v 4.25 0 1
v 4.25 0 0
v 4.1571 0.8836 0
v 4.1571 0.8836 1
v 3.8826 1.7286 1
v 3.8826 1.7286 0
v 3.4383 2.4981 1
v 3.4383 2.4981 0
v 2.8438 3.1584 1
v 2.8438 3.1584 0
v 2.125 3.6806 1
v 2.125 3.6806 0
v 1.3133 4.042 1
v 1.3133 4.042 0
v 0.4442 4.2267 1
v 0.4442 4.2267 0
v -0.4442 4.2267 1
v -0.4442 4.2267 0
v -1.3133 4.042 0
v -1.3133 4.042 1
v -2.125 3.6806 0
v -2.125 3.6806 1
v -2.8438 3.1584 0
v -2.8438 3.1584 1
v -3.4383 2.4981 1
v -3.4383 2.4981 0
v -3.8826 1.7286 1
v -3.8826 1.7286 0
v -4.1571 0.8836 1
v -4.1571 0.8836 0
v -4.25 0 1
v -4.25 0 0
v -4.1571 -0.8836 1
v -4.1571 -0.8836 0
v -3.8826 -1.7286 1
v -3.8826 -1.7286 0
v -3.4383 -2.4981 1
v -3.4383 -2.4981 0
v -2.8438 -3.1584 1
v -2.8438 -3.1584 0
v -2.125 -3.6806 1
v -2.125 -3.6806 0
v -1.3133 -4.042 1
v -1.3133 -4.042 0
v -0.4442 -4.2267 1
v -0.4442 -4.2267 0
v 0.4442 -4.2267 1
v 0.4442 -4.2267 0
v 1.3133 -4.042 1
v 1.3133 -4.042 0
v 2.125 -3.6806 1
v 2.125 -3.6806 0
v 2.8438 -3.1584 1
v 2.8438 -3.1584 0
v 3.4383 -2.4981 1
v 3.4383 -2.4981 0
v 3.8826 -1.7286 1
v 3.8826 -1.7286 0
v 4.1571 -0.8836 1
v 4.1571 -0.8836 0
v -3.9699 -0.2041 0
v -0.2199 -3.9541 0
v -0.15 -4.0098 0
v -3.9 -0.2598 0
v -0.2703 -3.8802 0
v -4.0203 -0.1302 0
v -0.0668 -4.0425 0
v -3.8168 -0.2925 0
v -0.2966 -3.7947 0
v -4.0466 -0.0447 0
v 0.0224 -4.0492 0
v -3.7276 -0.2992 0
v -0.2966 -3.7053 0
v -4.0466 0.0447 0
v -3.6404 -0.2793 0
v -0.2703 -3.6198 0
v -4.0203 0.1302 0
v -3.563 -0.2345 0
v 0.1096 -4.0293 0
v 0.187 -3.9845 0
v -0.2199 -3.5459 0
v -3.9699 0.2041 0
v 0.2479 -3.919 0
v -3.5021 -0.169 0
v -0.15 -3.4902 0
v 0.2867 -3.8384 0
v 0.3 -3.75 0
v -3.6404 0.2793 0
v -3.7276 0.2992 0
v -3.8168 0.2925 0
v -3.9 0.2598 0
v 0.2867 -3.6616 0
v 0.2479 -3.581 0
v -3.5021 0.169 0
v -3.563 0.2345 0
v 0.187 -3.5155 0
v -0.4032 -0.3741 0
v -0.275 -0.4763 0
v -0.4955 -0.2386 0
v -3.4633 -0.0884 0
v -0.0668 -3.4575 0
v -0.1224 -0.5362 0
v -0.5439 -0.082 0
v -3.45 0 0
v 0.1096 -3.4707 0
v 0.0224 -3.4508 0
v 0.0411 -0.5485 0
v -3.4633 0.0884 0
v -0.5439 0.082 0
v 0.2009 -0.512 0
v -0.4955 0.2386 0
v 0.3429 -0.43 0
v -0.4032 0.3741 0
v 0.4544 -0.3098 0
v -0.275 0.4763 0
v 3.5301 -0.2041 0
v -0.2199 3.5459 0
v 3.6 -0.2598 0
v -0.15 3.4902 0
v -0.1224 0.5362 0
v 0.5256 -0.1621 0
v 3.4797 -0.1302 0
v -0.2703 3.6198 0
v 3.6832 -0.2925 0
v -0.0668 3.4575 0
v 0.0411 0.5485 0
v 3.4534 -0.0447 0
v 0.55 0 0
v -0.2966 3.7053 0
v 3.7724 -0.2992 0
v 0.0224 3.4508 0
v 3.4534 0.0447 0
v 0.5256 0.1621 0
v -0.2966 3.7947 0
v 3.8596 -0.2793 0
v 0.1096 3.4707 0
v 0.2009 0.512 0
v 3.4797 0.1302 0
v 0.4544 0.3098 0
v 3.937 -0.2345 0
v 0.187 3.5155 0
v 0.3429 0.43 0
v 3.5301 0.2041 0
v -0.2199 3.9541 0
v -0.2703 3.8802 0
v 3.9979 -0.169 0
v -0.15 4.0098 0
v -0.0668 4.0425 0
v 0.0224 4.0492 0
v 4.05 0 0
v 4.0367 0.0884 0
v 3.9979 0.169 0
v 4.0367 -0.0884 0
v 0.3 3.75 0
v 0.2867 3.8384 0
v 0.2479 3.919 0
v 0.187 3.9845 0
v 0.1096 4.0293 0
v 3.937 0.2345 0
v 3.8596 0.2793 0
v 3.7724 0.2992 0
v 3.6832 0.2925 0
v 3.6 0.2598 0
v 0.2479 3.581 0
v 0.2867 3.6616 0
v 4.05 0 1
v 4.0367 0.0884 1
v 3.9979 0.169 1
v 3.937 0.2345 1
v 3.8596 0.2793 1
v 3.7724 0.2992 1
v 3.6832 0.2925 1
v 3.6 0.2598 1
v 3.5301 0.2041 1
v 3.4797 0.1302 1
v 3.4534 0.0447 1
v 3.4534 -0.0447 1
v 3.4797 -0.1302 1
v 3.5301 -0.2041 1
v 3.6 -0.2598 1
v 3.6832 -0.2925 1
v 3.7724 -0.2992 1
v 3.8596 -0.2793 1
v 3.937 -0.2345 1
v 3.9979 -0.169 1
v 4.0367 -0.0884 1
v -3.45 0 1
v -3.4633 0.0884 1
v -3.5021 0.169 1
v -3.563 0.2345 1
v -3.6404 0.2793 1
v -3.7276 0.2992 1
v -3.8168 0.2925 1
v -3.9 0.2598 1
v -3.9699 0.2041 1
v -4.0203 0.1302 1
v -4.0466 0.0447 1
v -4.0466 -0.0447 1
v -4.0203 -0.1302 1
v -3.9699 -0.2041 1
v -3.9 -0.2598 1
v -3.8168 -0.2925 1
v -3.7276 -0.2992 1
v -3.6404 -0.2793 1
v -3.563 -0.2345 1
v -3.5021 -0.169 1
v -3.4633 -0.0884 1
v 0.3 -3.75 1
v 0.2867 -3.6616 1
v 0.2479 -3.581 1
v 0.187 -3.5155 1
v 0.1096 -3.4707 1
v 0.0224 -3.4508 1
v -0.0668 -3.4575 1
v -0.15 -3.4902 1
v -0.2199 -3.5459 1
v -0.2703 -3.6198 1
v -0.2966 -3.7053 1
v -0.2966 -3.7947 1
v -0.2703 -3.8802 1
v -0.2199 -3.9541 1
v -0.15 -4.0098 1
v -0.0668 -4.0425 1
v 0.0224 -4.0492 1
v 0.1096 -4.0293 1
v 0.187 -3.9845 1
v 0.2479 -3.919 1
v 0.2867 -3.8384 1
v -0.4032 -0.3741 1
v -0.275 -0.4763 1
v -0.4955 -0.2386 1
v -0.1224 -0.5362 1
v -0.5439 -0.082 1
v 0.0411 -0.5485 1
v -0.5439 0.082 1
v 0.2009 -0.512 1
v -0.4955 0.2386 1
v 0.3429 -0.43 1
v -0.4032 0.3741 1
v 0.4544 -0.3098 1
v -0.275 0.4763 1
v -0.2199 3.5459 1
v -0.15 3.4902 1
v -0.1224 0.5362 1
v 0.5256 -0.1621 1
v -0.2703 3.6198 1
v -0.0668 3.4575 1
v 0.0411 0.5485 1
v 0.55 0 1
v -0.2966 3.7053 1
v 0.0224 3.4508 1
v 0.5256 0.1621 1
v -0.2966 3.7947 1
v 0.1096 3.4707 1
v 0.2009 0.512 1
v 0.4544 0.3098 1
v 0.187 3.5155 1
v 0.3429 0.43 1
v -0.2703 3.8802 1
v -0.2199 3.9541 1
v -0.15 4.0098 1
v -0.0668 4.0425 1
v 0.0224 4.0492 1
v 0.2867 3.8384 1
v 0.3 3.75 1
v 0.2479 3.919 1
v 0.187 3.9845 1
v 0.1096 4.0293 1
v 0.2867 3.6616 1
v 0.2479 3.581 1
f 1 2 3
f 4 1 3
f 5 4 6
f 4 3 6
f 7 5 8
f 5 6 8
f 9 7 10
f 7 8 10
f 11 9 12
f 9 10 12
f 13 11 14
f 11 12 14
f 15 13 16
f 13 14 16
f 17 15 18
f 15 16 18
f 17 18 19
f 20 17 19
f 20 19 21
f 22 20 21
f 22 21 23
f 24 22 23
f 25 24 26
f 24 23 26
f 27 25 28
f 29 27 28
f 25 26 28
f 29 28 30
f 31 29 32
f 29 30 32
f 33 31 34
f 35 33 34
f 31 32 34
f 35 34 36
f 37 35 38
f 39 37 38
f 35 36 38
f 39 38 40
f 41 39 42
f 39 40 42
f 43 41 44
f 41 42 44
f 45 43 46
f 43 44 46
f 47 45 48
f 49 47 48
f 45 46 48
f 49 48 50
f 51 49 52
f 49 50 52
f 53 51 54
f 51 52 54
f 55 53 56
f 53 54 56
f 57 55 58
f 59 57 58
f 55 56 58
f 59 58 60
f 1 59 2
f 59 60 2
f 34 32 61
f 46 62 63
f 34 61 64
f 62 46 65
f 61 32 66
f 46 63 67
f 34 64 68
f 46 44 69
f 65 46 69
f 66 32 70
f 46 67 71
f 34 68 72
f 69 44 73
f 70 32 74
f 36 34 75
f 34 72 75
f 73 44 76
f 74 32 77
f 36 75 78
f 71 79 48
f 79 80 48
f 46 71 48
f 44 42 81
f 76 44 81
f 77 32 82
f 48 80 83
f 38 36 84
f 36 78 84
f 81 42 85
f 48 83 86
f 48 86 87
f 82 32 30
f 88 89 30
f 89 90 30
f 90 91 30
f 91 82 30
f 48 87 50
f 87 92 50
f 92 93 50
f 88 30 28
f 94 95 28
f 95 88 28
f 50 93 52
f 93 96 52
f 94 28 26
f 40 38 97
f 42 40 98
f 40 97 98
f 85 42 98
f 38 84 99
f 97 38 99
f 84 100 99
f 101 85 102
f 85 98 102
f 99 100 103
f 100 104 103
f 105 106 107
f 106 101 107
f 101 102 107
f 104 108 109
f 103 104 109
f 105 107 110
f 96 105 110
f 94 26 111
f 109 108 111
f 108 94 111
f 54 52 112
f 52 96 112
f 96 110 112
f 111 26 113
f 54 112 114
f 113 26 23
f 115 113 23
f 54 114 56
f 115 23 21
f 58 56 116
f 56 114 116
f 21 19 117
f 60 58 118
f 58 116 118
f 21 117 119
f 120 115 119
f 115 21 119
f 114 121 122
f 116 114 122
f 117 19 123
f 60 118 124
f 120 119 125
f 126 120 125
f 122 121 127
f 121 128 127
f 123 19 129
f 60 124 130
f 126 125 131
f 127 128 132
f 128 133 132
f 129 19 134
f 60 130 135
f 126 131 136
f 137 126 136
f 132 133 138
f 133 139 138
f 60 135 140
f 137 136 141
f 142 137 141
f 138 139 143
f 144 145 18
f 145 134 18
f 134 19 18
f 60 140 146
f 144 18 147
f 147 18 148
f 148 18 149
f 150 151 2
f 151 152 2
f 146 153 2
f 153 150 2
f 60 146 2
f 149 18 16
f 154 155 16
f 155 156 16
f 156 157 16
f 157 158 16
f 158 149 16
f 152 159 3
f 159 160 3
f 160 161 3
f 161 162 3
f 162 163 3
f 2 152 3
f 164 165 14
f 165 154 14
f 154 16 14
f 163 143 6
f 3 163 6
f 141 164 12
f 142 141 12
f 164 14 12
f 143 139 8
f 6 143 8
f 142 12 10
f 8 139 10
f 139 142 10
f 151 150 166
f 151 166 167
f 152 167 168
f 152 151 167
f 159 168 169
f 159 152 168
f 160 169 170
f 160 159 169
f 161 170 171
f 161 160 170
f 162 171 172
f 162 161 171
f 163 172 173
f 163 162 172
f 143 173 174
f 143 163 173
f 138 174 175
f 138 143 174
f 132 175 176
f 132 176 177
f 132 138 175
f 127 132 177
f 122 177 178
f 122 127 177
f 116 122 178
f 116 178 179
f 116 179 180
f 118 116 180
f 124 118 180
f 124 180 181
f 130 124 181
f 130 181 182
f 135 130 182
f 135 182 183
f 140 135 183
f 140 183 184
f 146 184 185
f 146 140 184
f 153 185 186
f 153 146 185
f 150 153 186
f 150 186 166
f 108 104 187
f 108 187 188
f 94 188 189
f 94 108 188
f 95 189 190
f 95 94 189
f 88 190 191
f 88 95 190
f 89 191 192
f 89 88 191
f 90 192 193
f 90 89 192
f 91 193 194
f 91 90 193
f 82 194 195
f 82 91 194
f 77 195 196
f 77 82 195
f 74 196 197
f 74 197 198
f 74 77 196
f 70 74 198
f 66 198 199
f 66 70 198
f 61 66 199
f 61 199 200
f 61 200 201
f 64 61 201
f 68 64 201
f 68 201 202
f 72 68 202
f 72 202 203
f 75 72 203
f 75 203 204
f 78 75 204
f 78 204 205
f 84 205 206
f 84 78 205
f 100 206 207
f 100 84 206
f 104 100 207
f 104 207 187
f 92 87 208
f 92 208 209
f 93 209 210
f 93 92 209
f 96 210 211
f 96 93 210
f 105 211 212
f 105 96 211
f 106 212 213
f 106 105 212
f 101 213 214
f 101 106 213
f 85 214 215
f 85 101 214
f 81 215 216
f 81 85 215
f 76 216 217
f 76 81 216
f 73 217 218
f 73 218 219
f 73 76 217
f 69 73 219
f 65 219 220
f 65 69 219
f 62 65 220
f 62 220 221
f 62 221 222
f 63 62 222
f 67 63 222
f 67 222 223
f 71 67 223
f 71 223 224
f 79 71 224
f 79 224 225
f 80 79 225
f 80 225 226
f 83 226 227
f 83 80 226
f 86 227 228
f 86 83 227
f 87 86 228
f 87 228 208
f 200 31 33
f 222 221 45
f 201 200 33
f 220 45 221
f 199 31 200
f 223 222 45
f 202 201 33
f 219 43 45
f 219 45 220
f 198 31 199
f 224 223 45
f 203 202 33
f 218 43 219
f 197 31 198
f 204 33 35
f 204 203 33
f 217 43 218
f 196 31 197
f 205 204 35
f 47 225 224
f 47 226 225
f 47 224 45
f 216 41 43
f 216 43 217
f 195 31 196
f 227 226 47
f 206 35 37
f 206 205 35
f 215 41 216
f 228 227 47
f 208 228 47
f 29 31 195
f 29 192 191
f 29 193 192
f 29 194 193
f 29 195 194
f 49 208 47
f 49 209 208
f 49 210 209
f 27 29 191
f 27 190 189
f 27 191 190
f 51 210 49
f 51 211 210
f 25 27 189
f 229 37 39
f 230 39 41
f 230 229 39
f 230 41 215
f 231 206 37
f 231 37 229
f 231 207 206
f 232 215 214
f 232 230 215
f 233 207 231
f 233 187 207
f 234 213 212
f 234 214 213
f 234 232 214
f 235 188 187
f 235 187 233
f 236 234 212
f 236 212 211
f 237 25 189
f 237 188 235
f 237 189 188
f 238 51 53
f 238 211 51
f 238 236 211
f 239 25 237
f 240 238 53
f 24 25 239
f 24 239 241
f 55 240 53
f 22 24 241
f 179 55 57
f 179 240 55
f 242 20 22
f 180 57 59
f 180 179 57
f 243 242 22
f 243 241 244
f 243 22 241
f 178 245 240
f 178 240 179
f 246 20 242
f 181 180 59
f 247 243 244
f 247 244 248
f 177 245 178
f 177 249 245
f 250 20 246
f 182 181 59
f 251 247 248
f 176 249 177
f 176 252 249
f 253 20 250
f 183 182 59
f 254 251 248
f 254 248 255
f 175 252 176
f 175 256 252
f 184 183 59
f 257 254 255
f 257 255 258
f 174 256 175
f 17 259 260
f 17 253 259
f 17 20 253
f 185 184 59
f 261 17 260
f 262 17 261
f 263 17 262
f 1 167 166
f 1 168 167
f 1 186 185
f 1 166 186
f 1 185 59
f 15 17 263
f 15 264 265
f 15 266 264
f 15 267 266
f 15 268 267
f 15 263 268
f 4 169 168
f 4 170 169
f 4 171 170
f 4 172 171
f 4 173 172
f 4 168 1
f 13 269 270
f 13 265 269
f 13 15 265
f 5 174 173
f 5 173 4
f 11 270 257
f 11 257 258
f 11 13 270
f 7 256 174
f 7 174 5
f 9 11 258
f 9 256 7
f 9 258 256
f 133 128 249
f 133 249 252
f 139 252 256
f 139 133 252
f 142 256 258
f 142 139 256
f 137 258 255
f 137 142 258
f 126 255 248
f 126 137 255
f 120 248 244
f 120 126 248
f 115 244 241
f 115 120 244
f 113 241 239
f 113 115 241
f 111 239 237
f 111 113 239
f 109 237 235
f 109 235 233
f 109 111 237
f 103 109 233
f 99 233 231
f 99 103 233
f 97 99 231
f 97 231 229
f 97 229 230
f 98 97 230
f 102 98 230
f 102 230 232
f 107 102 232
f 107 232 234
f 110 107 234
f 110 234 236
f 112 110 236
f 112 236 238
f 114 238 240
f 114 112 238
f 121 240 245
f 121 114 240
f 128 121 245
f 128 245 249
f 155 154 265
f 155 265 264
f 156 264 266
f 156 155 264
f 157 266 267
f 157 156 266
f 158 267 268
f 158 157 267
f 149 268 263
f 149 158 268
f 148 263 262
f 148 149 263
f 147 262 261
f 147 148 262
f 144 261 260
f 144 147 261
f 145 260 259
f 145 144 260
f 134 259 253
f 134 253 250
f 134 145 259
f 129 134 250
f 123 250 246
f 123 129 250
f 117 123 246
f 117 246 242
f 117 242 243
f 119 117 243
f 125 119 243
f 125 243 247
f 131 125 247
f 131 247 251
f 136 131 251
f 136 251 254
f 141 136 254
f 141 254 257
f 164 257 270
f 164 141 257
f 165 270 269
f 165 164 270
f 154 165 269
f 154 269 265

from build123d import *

# Parameters (mm, degrees)
ESQUISSE1_R        = 4.25
ESQUISSE1_R_2      = 0.3
ESQUISSE1_R_3      = 0.55
BOSS_EXTRU_1_DEPTH = 1


with BuildPart() as part:
    # Esquisse1 → Boss.-Extru.1 (new body)
    with BuildSketch(Plane.XY):
        Circle(ESQUISSE1_R)
        with Locations((0, 3.75)):
            Circle(ESQUISSE1_R_2, mode=Mode.SUBTRACT)
        Circle(ESQUISSE1_R_3, mode=Mode.SUBTRACT)
        with Locations((3.75, 0)):
            Circle(ESQUISSE1_R_2, mode=Mode.SUBTRACT)
        with Locations((0, -3.75)):
            Circle(ESQUISSE1_R_2, mode=Mode.SUBTRACT)
        with Locations((-3.75, 0)):
            Circle(ESQUISSE1_R_2, mode=Mode.SUBTRACT)
    extrude(amount=BOSS_EXTRU_1_DEPTH)


solid = part.part
